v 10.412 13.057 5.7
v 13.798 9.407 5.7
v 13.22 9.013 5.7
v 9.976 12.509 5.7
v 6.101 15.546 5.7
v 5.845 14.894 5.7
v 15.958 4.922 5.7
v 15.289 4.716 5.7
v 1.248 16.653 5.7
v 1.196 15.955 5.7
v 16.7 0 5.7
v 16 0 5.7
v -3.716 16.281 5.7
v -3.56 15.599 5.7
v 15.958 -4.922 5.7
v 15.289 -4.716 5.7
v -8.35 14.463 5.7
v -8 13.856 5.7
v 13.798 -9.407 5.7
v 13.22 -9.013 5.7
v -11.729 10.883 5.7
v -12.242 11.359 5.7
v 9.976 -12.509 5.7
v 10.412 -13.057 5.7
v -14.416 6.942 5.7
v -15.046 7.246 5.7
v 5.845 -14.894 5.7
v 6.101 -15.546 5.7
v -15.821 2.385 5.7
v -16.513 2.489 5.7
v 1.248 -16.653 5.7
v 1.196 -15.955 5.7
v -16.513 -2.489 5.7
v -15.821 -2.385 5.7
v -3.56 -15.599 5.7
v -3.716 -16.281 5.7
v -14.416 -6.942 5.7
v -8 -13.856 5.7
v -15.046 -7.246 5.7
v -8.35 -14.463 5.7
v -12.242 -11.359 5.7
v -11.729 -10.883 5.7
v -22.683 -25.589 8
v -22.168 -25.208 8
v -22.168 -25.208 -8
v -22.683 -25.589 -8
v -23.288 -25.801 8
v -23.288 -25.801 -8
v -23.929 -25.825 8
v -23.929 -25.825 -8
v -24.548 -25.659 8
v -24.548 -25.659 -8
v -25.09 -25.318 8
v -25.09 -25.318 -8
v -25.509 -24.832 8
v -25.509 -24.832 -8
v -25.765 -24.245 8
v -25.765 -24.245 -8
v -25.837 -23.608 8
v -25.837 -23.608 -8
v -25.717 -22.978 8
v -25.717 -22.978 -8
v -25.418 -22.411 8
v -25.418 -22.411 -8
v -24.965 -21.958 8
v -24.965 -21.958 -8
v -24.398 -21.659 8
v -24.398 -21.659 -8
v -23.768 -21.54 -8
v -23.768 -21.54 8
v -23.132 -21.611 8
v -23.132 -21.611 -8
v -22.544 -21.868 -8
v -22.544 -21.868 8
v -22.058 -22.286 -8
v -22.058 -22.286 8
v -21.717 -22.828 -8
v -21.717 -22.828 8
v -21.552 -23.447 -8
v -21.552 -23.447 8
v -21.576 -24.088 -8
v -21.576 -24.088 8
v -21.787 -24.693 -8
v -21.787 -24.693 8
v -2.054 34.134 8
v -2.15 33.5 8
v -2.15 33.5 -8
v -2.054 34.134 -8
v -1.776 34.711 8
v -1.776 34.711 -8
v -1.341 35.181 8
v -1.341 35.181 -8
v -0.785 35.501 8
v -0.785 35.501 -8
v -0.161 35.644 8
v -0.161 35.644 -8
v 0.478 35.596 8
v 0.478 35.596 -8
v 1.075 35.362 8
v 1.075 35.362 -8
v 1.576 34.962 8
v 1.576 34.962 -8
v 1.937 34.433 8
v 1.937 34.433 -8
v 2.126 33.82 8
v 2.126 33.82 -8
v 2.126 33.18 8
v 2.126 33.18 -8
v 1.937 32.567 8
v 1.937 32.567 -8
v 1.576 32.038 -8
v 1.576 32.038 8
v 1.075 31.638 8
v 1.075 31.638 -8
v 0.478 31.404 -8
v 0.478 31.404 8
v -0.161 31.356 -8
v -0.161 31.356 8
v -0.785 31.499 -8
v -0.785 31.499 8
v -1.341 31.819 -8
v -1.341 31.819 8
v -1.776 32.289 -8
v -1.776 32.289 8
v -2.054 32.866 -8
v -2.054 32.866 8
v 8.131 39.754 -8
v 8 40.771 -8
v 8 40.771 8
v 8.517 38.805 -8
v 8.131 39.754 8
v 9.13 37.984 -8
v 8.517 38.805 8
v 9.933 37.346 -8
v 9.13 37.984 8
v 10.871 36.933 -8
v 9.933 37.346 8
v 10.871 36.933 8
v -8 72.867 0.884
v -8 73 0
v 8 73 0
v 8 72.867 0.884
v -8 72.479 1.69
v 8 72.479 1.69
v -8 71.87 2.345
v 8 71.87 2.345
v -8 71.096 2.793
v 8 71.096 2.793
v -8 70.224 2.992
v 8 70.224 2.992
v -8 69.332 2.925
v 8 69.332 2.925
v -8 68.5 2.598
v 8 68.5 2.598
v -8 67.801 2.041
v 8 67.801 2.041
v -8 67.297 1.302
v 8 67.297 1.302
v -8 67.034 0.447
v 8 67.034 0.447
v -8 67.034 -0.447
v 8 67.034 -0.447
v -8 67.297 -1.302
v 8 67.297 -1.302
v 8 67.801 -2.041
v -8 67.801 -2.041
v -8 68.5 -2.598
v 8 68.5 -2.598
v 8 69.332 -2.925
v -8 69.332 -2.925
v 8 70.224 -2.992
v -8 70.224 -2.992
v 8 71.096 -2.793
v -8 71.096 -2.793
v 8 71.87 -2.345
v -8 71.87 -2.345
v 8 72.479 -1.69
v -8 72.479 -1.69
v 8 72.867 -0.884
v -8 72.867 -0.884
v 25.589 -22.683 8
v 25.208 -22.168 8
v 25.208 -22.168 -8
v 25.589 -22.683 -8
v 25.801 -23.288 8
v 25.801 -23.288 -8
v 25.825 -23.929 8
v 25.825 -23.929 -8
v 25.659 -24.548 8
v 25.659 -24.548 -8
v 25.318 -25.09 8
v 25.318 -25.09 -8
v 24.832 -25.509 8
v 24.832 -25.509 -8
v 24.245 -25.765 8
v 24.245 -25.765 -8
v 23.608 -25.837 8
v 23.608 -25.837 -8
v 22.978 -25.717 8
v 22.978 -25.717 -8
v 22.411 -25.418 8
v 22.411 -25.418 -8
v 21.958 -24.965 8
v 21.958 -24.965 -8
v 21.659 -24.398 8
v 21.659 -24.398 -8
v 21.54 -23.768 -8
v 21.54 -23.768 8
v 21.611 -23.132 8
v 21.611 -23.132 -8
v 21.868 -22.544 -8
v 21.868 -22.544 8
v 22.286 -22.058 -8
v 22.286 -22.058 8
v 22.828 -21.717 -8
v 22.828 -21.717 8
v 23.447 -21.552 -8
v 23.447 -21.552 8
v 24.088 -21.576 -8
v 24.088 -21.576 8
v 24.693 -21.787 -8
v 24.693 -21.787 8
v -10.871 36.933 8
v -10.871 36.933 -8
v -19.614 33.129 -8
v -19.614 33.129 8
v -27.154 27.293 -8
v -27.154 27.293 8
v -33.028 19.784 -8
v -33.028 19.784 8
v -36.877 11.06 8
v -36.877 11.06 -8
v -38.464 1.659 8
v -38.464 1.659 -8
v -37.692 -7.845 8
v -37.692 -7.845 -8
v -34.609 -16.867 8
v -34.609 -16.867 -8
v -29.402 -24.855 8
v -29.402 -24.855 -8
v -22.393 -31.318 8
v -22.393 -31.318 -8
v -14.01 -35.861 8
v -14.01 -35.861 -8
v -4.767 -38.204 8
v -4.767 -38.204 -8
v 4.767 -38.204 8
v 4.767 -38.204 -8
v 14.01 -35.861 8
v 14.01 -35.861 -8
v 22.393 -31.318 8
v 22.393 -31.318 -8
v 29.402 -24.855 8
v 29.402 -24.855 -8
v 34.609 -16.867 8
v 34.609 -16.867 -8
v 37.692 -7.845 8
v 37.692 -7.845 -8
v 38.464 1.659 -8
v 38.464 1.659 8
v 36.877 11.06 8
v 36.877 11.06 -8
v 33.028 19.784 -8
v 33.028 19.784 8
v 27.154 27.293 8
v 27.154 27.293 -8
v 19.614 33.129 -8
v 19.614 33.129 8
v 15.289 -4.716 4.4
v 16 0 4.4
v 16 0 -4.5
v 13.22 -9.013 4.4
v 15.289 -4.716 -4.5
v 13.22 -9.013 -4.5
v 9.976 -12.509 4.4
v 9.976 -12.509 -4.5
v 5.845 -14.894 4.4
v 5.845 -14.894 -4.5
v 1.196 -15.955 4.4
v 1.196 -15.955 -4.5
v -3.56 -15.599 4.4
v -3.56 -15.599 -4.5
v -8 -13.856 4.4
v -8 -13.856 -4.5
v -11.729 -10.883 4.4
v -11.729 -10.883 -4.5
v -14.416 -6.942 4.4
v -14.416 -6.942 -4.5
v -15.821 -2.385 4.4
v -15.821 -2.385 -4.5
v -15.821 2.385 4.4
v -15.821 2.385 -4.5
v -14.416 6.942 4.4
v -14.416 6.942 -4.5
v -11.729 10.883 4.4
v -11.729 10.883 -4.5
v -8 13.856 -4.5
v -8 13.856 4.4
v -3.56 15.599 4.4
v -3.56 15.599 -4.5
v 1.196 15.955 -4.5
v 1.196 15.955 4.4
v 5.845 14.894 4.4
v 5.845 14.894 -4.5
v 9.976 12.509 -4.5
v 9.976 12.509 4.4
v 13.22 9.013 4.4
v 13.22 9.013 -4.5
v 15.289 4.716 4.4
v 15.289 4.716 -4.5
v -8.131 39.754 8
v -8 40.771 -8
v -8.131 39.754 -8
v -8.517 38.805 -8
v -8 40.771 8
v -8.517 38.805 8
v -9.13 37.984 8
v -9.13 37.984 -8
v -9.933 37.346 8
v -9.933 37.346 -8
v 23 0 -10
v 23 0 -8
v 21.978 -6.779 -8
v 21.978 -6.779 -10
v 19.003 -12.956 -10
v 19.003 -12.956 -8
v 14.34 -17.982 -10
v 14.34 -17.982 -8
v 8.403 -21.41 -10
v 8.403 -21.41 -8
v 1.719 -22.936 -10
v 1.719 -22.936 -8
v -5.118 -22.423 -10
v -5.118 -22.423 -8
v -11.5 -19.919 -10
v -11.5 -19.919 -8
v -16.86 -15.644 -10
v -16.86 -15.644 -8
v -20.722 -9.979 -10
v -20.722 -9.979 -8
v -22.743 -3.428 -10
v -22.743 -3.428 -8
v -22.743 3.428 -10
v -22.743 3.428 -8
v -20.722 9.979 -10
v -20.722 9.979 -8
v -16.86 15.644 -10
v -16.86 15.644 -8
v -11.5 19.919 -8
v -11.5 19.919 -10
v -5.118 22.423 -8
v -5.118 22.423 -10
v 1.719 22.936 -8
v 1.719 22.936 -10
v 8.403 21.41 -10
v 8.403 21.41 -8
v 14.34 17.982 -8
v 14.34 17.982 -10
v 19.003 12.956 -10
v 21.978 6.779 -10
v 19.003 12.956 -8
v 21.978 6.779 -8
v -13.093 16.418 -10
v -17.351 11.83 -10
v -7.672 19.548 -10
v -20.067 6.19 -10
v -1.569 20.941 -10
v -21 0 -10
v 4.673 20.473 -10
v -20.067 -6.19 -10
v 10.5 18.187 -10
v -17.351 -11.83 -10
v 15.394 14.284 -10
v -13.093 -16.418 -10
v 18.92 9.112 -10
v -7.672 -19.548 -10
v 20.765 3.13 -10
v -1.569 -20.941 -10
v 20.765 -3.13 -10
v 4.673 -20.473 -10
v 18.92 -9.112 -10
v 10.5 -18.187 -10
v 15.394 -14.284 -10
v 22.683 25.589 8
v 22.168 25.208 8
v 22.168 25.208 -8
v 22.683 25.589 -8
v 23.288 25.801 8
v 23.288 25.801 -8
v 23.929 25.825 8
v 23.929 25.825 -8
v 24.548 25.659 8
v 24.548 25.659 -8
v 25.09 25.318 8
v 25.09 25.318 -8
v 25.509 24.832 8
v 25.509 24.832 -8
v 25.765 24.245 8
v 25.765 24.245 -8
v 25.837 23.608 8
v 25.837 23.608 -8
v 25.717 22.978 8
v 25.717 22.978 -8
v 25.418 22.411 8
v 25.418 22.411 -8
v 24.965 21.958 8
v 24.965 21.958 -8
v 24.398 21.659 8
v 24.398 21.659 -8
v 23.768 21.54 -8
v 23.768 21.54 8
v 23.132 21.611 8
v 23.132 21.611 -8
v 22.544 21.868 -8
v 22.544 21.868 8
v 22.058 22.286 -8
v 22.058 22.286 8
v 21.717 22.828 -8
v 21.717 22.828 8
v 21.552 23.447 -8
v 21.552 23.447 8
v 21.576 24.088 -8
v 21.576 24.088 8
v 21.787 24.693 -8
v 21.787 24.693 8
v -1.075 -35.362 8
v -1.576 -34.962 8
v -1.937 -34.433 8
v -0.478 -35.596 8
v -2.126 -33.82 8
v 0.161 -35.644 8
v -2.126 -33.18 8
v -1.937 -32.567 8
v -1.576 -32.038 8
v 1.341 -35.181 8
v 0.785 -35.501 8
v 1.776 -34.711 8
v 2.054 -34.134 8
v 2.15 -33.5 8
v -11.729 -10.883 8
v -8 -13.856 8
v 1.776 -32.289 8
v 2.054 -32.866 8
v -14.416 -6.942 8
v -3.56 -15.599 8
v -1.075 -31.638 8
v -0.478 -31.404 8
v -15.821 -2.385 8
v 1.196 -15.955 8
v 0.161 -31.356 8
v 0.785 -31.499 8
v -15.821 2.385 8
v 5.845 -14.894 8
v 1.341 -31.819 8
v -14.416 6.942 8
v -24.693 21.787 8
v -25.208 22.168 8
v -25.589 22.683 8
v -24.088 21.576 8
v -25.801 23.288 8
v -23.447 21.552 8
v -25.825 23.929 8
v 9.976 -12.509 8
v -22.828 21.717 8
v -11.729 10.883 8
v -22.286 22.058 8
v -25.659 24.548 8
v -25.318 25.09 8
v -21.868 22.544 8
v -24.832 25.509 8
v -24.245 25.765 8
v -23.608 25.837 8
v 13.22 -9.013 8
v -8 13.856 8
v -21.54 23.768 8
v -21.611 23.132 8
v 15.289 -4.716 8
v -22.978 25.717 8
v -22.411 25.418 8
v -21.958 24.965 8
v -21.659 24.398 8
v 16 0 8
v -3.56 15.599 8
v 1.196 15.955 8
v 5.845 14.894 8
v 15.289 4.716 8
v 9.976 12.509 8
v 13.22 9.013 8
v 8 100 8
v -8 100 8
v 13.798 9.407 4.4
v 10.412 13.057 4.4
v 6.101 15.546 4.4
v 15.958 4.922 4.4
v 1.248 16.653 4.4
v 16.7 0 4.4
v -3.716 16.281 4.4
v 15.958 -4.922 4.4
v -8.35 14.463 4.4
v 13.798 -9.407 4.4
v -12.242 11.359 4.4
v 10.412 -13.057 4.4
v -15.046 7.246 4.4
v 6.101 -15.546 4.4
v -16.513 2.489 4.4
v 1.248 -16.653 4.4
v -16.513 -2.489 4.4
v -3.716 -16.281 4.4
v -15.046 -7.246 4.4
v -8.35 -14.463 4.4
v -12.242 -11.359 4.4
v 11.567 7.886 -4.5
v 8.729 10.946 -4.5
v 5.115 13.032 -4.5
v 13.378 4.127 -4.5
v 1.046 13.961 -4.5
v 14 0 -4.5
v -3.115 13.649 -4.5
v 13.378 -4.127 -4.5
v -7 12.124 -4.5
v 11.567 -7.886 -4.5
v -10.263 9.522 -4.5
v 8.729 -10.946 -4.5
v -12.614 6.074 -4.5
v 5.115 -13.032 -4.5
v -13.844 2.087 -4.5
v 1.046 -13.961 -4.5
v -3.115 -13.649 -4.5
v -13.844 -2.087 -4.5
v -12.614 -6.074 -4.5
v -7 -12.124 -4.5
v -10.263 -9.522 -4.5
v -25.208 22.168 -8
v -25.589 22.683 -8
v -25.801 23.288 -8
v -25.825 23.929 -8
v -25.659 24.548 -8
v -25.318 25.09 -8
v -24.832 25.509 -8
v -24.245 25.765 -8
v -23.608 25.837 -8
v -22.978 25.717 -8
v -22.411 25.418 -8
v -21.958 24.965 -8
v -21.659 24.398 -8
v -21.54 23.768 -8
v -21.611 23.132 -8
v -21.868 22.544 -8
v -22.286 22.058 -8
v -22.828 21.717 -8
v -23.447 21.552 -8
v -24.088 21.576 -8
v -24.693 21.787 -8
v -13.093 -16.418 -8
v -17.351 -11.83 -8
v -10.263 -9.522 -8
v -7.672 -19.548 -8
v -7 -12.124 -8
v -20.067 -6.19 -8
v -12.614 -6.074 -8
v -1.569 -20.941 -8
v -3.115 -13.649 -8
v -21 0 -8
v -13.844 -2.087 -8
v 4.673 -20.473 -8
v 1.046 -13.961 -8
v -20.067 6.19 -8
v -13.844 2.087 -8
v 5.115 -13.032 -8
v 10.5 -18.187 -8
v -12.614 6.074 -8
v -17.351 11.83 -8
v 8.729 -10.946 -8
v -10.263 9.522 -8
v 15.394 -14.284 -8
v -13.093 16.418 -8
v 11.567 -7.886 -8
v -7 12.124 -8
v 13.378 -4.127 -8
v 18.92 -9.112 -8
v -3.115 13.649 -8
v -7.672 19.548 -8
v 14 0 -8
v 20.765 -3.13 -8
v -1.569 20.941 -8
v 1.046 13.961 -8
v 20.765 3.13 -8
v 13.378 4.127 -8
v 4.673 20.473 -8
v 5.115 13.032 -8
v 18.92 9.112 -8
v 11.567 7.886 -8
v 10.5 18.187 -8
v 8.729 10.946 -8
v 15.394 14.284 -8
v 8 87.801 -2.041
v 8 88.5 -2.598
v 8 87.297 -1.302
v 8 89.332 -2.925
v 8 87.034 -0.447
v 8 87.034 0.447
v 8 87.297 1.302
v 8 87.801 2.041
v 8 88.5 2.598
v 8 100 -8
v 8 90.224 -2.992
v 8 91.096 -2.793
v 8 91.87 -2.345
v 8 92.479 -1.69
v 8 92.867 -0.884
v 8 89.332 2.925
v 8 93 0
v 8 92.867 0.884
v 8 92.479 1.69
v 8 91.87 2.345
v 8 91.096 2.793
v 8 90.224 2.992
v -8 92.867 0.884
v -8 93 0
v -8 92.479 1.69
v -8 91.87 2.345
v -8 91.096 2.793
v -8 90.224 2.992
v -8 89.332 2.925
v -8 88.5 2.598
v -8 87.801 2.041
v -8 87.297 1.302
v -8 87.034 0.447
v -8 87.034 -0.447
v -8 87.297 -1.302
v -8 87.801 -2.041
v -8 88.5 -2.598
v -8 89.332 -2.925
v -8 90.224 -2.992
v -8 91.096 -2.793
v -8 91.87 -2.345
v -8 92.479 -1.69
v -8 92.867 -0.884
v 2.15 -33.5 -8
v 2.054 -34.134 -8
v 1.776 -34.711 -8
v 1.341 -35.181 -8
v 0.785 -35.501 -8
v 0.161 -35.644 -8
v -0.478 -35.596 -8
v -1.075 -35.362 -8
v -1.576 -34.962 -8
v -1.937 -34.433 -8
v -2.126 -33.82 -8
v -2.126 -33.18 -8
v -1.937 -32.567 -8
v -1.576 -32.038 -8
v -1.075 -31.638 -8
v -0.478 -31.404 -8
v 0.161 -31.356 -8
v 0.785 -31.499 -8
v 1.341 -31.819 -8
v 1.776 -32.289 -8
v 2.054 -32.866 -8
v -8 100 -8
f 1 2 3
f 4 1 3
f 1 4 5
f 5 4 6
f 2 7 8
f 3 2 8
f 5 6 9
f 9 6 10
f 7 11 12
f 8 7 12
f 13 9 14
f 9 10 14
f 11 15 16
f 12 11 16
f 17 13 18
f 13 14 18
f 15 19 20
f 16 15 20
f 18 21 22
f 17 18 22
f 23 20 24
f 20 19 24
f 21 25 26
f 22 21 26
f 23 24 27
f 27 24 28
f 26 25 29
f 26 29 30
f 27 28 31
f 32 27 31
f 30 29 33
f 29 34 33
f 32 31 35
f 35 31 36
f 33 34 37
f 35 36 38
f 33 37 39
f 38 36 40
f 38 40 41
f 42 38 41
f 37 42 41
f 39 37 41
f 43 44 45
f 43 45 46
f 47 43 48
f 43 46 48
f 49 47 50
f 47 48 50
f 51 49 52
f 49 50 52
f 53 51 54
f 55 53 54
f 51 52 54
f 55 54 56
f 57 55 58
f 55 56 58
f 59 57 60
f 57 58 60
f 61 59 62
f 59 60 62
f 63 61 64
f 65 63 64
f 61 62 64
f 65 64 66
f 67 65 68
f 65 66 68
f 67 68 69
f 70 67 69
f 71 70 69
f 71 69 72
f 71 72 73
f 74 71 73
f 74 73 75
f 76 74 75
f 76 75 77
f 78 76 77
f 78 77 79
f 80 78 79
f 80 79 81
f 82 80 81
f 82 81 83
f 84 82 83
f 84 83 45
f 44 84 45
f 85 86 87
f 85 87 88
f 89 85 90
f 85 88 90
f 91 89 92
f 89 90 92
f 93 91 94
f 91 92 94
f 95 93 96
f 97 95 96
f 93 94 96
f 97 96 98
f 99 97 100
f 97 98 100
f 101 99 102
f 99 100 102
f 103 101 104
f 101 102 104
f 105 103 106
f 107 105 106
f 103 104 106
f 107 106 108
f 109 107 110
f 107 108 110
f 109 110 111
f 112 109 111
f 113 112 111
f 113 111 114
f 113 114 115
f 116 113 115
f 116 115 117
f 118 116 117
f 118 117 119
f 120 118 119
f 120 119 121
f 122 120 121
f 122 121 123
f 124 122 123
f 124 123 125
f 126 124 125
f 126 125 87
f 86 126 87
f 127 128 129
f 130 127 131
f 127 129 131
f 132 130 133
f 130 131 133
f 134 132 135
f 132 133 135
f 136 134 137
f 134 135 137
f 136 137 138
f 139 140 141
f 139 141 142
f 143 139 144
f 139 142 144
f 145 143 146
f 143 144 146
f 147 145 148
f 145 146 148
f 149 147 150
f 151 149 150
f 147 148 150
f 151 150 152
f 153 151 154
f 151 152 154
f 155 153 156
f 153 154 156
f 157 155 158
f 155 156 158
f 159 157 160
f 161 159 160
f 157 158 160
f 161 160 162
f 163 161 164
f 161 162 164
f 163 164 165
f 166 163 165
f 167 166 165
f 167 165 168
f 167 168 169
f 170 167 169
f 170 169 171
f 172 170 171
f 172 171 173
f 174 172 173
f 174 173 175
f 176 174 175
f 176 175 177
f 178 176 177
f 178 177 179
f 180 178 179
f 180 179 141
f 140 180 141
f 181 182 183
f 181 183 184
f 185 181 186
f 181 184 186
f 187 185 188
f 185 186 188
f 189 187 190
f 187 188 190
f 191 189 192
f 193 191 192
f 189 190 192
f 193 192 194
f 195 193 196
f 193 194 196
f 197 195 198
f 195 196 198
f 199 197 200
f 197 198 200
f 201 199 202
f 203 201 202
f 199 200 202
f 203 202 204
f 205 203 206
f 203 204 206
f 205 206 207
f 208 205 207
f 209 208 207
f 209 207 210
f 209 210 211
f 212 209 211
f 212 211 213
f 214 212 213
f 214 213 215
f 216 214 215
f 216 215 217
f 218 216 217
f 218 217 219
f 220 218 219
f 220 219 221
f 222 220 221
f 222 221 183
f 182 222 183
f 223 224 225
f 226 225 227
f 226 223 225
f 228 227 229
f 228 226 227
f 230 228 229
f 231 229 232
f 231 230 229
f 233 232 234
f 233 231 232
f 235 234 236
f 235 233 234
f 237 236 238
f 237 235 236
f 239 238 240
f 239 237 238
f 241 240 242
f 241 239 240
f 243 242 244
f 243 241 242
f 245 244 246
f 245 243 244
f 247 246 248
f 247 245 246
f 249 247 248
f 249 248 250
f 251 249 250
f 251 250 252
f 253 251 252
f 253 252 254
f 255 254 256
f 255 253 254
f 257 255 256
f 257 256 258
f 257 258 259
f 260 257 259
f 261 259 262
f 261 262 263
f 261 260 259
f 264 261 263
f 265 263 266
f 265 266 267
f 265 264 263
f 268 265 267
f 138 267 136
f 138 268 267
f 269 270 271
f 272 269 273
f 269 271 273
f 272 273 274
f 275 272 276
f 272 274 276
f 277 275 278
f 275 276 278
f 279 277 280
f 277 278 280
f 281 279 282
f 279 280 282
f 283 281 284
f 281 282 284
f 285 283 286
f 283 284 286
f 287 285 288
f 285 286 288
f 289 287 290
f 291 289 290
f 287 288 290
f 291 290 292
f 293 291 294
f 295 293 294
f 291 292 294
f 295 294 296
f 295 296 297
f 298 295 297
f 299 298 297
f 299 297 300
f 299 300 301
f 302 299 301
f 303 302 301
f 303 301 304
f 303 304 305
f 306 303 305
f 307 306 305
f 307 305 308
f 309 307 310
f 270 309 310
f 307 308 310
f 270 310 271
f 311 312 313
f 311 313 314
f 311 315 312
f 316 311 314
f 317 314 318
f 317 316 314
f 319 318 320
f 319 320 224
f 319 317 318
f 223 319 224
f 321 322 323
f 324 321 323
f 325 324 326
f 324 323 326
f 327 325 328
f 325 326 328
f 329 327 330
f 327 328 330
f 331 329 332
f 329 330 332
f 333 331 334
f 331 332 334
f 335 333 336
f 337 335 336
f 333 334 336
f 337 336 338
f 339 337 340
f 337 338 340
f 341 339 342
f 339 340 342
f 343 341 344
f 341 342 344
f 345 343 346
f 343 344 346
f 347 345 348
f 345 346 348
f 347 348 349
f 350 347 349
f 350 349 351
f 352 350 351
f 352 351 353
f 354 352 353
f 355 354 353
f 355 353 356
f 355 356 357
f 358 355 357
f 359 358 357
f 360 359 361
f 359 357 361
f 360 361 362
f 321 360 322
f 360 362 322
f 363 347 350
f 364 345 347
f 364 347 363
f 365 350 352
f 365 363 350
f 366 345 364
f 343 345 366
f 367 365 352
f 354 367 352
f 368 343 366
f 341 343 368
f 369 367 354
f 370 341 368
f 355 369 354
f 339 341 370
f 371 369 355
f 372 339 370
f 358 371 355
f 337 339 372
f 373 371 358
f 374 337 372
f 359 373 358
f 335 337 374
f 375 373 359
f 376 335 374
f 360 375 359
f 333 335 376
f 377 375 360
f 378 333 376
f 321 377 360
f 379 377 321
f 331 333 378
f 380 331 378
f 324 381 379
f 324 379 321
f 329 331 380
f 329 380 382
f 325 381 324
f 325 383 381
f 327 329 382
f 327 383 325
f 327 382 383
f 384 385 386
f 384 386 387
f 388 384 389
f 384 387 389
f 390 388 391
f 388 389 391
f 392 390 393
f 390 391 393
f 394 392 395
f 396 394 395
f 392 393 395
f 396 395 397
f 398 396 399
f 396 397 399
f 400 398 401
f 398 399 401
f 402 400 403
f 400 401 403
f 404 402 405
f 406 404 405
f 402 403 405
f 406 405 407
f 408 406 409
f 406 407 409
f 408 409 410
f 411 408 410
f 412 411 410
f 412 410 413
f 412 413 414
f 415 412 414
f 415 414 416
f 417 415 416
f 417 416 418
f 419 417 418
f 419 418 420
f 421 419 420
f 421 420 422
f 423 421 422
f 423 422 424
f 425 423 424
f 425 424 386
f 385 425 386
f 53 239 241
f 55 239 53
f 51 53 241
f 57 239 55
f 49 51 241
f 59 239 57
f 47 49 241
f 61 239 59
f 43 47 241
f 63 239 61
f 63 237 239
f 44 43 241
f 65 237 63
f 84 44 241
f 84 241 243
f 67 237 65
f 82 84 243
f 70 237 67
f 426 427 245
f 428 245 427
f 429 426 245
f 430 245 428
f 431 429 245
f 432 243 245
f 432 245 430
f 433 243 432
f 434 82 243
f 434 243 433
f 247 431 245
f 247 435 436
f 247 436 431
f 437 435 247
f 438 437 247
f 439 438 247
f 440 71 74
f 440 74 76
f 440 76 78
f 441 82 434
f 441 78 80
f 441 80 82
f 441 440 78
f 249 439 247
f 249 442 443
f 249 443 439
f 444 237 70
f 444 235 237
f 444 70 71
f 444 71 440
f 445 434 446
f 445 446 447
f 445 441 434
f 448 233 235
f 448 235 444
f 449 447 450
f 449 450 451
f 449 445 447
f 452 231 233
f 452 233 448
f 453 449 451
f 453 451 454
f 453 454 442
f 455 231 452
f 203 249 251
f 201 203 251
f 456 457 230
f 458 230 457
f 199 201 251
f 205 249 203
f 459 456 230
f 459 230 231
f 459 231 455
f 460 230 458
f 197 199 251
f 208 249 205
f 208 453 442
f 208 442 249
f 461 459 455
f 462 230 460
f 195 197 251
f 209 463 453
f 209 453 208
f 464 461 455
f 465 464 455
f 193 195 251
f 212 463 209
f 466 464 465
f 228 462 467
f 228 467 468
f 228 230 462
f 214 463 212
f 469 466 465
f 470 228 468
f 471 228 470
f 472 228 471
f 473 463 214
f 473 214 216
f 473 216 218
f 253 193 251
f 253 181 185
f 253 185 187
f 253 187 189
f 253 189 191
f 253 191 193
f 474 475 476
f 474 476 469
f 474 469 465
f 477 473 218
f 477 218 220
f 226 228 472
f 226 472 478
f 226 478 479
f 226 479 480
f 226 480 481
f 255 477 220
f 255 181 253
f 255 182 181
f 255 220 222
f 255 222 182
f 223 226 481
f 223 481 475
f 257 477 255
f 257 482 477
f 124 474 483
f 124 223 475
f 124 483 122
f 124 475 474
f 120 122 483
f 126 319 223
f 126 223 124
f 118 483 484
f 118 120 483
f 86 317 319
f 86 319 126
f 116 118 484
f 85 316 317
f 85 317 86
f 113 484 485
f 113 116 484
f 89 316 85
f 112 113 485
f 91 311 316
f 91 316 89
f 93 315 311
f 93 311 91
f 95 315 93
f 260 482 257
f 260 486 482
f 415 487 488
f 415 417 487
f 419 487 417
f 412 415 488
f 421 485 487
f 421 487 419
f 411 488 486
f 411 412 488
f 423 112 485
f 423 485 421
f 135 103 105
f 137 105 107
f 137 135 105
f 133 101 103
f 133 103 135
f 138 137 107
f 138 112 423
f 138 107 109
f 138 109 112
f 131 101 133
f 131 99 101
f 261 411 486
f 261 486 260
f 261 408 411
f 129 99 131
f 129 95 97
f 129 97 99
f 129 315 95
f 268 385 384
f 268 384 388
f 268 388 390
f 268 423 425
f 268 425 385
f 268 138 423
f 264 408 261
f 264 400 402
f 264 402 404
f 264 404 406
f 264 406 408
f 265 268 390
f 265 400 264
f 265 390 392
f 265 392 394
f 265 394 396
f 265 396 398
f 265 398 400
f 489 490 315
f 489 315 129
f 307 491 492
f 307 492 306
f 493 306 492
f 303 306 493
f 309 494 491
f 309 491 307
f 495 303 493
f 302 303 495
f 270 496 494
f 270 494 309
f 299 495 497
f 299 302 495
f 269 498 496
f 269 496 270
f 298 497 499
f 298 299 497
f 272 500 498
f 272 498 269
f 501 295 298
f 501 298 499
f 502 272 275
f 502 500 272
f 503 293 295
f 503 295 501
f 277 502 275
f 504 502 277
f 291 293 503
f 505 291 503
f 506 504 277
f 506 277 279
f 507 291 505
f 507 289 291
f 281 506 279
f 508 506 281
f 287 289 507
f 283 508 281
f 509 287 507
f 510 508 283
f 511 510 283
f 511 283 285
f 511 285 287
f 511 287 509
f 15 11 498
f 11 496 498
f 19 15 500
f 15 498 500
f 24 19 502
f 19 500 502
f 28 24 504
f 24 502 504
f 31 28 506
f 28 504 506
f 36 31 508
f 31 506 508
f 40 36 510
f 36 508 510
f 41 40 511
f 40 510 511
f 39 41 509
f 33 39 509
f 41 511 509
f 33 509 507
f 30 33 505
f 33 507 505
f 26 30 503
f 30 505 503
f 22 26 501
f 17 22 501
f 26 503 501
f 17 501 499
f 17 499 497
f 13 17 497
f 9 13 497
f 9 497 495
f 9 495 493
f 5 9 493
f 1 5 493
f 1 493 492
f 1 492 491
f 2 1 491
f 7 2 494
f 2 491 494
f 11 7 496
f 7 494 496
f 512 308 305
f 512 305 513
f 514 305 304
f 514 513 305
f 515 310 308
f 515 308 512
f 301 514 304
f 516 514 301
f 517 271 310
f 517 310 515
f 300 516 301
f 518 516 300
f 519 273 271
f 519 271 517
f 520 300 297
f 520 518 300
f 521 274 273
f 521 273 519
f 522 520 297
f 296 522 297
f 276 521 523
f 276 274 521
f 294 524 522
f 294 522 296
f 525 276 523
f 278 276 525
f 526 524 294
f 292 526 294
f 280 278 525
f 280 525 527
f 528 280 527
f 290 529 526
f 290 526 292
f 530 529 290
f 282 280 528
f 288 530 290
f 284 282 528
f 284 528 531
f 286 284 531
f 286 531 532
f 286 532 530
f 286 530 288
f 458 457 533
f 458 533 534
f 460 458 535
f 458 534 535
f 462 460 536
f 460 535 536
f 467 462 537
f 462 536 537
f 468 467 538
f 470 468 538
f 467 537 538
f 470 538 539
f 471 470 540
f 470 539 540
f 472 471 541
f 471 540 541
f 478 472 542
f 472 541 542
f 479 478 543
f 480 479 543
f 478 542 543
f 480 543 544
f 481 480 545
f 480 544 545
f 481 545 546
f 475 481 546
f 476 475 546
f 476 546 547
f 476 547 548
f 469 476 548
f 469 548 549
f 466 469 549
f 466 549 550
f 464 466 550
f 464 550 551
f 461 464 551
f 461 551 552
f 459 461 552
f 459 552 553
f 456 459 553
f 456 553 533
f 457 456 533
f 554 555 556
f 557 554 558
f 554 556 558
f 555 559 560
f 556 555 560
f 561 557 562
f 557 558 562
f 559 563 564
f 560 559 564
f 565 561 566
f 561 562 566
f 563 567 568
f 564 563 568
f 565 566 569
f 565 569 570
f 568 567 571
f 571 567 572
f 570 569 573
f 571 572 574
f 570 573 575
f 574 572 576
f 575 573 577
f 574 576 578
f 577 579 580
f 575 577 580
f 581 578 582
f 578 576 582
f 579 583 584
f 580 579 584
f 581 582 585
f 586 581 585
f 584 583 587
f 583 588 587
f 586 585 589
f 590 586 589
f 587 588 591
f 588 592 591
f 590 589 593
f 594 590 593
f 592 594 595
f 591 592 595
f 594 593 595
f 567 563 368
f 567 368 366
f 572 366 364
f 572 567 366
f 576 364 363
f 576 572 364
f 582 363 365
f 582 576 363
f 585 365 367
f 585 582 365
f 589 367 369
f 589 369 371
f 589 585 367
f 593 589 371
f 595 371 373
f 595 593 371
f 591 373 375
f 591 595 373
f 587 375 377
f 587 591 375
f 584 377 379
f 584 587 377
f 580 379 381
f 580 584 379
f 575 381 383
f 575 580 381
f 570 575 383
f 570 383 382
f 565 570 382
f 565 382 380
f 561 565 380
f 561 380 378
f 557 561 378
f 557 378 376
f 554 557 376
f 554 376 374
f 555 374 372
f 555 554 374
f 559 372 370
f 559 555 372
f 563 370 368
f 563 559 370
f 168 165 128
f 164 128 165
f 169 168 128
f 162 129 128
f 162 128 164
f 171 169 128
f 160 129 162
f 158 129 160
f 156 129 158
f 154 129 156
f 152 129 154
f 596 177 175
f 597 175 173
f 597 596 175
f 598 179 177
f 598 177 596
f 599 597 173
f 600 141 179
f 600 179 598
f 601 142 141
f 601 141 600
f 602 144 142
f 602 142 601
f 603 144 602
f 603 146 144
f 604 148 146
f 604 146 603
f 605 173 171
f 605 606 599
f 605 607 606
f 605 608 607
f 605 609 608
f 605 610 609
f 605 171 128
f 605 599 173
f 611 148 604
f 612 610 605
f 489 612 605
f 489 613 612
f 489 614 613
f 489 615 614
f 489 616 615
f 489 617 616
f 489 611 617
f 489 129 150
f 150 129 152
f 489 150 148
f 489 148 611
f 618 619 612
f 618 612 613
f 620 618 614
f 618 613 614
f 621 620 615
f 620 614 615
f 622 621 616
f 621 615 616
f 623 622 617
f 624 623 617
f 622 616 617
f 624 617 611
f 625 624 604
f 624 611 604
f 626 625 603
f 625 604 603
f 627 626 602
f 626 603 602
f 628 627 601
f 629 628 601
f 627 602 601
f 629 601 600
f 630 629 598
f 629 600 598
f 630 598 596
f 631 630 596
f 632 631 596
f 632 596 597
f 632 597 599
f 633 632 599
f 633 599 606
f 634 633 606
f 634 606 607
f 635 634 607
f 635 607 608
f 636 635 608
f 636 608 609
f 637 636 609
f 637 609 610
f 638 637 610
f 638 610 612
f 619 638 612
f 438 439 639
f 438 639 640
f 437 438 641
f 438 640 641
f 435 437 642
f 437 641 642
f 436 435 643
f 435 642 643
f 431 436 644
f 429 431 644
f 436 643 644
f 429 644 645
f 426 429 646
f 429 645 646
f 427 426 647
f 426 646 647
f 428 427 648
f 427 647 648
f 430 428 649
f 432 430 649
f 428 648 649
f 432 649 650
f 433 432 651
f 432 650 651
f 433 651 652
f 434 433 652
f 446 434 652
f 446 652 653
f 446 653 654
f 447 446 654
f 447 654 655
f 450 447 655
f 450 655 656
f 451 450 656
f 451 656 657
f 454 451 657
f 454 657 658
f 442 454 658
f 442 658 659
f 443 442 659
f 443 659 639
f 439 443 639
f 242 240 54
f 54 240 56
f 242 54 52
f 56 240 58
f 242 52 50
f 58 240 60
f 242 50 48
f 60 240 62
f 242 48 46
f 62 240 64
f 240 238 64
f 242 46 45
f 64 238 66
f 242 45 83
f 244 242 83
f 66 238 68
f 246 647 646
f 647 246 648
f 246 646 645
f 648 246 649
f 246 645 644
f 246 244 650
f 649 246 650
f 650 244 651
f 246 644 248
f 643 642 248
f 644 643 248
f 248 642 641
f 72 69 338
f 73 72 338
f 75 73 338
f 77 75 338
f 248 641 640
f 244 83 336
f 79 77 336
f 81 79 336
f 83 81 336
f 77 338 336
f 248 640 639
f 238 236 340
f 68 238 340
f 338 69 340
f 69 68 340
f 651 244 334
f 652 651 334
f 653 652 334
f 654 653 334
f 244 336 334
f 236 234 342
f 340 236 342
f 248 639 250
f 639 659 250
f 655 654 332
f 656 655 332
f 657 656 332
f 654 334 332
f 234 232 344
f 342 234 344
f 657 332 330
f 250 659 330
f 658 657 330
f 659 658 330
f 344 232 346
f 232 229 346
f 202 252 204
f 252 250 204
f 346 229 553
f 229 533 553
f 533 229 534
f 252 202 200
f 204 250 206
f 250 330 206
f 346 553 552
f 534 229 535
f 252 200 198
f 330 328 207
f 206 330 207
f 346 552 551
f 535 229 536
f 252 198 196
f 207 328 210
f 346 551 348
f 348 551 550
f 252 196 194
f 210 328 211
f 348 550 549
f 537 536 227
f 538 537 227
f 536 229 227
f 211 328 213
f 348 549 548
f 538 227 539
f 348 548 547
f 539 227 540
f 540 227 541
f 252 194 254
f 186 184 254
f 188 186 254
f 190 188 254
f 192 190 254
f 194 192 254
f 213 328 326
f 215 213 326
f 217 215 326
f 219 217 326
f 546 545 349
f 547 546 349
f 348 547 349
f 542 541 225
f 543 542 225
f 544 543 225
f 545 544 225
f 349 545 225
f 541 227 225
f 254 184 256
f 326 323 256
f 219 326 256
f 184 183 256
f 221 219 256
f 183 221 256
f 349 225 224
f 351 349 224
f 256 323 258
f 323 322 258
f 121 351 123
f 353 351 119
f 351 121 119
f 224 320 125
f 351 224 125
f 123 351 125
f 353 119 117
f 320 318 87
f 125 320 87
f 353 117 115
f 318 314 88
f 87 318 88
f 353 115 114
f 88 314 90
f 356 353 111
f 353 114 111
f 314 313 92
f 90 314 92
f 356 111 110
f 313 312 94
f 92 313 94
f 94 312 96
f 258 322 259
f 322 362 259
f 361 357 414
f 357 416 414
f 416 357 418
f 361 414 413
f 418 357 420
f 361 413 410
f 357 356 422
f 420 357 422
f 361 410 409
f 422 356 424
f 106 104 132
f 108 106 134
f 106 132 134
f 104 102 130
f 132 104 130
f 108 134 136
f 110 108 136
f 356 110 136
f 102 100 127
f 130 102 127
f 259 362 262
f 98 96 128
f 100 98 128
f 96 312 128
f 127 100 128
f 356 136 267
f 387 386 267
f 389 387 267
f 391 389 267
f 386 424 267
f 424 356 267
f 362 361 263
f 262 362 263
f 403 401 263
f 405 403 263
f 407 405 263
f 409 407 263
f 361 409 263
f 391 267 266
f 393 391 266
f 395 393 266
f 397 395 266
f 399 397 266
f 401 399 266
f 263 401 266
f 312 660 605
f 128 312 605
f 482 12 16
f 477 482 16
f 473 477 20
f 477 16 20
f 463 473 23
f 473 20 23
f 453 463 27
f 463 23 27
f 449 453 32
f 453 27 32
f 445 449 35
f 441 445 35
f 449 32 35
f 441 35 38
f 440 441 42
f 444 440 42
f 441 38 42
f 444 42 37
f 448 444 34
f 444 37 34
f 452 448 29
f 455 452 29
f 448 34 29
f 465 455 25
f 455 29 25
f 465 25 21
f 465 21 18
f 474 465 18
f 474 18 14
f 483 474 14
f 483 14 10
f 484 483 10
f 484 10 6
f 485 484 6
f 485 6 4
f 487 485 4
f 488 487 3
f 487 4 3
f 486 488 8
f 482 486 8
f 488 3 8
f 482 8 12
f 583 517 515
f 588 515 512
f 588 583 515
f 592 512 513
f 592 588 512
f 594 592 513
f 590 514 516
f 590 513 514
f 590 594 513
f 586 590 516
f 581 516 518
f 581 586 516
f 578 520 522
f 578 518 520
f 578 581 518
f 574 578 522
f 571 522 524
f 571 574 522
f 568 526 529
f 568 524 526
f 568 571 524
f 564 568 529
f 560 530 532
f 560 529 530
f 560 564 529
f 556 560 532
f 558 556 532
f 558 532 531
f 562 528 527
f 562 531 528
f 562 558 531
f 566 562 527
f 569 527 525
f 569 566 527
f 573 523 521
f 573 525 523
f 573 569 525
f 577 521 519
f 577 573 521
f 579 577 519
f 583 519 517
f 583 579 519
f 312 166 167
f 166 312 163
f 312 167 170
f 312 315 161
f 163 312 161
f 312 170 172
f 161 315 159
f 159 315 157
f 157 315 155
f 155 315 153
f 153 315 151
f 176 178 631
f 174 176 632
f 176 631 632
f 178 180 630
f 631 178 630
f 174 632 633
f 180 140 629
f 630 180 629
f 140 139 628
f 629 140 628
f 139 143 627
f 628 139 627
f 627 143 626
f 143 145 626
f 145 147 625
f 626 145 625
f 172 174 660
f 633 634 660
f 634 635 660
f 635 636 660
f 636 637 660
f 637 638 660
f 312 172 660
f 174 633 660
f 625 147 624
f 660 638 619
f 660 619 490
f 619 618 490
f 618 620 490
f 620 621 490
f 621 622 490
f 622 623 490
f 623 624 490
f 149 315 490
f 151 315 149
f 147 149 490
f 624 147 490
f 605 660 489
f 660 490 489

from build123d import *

# Parameters (mm, degrees)
SKETCH1_R           = 38.5
SKETCH1_R_2         = 14
BOSS_EXTRUDE1_DEPTH = 8
SKETCH2_W           = 16
SKETCH2_H           = 62.340339885
BOSS_EXTRUDE2_DEPTH = 8
FILLET1_R           = 4
SKETCH3_W           = 12.5
SKETCH3_H           = 2
SKETCH4_W           = 1.3
SKETCH4_H           = 0.7
SKETCH5_R           = 23
SKETCH5_R_2         = 21
BOSS_EXTRUDE3_DEPTH = 2
SKETCH6_R           = 2.15
CUT_EXTRUDE1_DEPTH  = 109.343204678
CIRPATTERN1_COUNT   = 8
SKETCH7_R           = 3
CUT_EXTRUDE2_DEPTH  = 111.735044137


with BuildPart() as part:
    # Sketch1 → Boss-Extrude1 (new, symmetric)
    with BuildSketch(Plane.XY):
        Circle(SKETCH1_R)
        Circle(SKETCH1_R_2, mode=Mode.SUBTRACT)
    extrude(amount=BOSS_EXTRUDE1_DEPTH, both=True)

    # Sketch2 → Boss-Extrude2 (add, symmetric)
    with BuildSketch(Plane.XY):
        with Locations((0, 68.829830058)):
            Rectangle(SKETCH2_W, SKETCH2_H)
    extrude(amount=BOSS_EXTRUDE2_DEPTH, both=True)

    # Fillet1
    fillet1_edges = [part.edges().sort_by_distance(p)[0] for p in [
        (-8, 37.659660115, 0),
        (8, 37.659660115, 0),
    ]]
    fillet(fillet1_edges, radius=FILLET1_R)

    # Sketch3 → Cut-Revolve1 (revolve, cut)
    with BuildSketch(Plane(origin=(0, 0, 0), x_dir=(0, 0, -1), z_dir=(1, 0, 0)), mode=Mode.PRIVATE) as cut_revolve1_sk:
        with Locations((-1.75, 15)):
            Rectangle(SKETCH3_W, SKETCH3_H)
    revolve(cut_revolve1_sk.sketch.rotate(Axis((0, 0, 0), (0, 0, -1)), 90), axis=Axis((0, 0, 0), (0, 0, -1)), mode=Mode.SUBTRACT)

    # Sketch4 → Cut-Revolve2 (revolve, cut)
    with BuildSketch(Plane(origin=(0, 0, 0), x_dir=(0, 0, -1), z_dir=(1, 0, 0)), mode=Mode.PRIVATE) as cut_revolve2_sk:
        with Locations((-5.05, 16.35)):
            Rectangle(SKETCH4_W, SKETCH4_H)
    revolve(cut_revolve2_sk.sketch.rotate(Axis((0, 0, 0), (0, 0, -1)), 90), axis=Axis((0, 0, 0), (0, 0, -1)), mode=Mode.SUBTRACT)

    # Sketch5 → Boss-Extrude3 (add)
    with BuildSketch(Plane(origin=(0, 0, -8), x_dir=(-1, 0, 0), z_dir=(0, 0, -1))):
        with Locations(Location((0, 0, 0), (0, 0, 180))):
            Circle(SKETCH5_R)
        Circle(SKETCH5_R_2, mode=Mode.SUBTRACT)
    extrude(amount=BOSS_EXTRUDE3_DEPTH)

    # Sketch6 → Cut-Extrude1 (cut, through all)
    with BuildSketch(Plane(origin=(0, 0, -8), x_dir=(-1, 0, 0), z_dir=(0, 0, -1))):
        with Locations((0, 33.5)):
            Circle(SKETCH6_R)
    cut_extrude1 = extrude(amount=-CUT_EXTRUDE1_DEPTH, mode=Mode.SUBTRACT)

    # CirPattern1: Cut-Extrude1 ×8 about axis, 2 skipped
    cirpattern1_axis = Axis((0, 0, 0), (0, 0, 1))
    add([cut_extrude1.rotate(cirpattern1_axis, i * 360 / CIRPATTERN1_COUNT) for i in range(1, CIRPATTERN1_COUNT) if i not in (2, 6)], mode=Mode.SUBTRACT)

    # Sketch7 → Cut-Extrude2 (cut, through all)
    with BuildSketch(Plane(origin=(8, 0, 0), x_dir=(0, 0, -1), z_dir=(1, 0, 0))):
        with Locations(Location((0, 90, 0), (0, 0, 90))):
            Circle(SKETCH7_R)
        with Locations(Location((0, 70, 0), (0, 0, 90))):
            Circle(SKETCH7_R)
    extrude(amount=-CUT_EXTRUDE2_DEPTH, mode=Mode.SUBTRACT)


solid = part.part
